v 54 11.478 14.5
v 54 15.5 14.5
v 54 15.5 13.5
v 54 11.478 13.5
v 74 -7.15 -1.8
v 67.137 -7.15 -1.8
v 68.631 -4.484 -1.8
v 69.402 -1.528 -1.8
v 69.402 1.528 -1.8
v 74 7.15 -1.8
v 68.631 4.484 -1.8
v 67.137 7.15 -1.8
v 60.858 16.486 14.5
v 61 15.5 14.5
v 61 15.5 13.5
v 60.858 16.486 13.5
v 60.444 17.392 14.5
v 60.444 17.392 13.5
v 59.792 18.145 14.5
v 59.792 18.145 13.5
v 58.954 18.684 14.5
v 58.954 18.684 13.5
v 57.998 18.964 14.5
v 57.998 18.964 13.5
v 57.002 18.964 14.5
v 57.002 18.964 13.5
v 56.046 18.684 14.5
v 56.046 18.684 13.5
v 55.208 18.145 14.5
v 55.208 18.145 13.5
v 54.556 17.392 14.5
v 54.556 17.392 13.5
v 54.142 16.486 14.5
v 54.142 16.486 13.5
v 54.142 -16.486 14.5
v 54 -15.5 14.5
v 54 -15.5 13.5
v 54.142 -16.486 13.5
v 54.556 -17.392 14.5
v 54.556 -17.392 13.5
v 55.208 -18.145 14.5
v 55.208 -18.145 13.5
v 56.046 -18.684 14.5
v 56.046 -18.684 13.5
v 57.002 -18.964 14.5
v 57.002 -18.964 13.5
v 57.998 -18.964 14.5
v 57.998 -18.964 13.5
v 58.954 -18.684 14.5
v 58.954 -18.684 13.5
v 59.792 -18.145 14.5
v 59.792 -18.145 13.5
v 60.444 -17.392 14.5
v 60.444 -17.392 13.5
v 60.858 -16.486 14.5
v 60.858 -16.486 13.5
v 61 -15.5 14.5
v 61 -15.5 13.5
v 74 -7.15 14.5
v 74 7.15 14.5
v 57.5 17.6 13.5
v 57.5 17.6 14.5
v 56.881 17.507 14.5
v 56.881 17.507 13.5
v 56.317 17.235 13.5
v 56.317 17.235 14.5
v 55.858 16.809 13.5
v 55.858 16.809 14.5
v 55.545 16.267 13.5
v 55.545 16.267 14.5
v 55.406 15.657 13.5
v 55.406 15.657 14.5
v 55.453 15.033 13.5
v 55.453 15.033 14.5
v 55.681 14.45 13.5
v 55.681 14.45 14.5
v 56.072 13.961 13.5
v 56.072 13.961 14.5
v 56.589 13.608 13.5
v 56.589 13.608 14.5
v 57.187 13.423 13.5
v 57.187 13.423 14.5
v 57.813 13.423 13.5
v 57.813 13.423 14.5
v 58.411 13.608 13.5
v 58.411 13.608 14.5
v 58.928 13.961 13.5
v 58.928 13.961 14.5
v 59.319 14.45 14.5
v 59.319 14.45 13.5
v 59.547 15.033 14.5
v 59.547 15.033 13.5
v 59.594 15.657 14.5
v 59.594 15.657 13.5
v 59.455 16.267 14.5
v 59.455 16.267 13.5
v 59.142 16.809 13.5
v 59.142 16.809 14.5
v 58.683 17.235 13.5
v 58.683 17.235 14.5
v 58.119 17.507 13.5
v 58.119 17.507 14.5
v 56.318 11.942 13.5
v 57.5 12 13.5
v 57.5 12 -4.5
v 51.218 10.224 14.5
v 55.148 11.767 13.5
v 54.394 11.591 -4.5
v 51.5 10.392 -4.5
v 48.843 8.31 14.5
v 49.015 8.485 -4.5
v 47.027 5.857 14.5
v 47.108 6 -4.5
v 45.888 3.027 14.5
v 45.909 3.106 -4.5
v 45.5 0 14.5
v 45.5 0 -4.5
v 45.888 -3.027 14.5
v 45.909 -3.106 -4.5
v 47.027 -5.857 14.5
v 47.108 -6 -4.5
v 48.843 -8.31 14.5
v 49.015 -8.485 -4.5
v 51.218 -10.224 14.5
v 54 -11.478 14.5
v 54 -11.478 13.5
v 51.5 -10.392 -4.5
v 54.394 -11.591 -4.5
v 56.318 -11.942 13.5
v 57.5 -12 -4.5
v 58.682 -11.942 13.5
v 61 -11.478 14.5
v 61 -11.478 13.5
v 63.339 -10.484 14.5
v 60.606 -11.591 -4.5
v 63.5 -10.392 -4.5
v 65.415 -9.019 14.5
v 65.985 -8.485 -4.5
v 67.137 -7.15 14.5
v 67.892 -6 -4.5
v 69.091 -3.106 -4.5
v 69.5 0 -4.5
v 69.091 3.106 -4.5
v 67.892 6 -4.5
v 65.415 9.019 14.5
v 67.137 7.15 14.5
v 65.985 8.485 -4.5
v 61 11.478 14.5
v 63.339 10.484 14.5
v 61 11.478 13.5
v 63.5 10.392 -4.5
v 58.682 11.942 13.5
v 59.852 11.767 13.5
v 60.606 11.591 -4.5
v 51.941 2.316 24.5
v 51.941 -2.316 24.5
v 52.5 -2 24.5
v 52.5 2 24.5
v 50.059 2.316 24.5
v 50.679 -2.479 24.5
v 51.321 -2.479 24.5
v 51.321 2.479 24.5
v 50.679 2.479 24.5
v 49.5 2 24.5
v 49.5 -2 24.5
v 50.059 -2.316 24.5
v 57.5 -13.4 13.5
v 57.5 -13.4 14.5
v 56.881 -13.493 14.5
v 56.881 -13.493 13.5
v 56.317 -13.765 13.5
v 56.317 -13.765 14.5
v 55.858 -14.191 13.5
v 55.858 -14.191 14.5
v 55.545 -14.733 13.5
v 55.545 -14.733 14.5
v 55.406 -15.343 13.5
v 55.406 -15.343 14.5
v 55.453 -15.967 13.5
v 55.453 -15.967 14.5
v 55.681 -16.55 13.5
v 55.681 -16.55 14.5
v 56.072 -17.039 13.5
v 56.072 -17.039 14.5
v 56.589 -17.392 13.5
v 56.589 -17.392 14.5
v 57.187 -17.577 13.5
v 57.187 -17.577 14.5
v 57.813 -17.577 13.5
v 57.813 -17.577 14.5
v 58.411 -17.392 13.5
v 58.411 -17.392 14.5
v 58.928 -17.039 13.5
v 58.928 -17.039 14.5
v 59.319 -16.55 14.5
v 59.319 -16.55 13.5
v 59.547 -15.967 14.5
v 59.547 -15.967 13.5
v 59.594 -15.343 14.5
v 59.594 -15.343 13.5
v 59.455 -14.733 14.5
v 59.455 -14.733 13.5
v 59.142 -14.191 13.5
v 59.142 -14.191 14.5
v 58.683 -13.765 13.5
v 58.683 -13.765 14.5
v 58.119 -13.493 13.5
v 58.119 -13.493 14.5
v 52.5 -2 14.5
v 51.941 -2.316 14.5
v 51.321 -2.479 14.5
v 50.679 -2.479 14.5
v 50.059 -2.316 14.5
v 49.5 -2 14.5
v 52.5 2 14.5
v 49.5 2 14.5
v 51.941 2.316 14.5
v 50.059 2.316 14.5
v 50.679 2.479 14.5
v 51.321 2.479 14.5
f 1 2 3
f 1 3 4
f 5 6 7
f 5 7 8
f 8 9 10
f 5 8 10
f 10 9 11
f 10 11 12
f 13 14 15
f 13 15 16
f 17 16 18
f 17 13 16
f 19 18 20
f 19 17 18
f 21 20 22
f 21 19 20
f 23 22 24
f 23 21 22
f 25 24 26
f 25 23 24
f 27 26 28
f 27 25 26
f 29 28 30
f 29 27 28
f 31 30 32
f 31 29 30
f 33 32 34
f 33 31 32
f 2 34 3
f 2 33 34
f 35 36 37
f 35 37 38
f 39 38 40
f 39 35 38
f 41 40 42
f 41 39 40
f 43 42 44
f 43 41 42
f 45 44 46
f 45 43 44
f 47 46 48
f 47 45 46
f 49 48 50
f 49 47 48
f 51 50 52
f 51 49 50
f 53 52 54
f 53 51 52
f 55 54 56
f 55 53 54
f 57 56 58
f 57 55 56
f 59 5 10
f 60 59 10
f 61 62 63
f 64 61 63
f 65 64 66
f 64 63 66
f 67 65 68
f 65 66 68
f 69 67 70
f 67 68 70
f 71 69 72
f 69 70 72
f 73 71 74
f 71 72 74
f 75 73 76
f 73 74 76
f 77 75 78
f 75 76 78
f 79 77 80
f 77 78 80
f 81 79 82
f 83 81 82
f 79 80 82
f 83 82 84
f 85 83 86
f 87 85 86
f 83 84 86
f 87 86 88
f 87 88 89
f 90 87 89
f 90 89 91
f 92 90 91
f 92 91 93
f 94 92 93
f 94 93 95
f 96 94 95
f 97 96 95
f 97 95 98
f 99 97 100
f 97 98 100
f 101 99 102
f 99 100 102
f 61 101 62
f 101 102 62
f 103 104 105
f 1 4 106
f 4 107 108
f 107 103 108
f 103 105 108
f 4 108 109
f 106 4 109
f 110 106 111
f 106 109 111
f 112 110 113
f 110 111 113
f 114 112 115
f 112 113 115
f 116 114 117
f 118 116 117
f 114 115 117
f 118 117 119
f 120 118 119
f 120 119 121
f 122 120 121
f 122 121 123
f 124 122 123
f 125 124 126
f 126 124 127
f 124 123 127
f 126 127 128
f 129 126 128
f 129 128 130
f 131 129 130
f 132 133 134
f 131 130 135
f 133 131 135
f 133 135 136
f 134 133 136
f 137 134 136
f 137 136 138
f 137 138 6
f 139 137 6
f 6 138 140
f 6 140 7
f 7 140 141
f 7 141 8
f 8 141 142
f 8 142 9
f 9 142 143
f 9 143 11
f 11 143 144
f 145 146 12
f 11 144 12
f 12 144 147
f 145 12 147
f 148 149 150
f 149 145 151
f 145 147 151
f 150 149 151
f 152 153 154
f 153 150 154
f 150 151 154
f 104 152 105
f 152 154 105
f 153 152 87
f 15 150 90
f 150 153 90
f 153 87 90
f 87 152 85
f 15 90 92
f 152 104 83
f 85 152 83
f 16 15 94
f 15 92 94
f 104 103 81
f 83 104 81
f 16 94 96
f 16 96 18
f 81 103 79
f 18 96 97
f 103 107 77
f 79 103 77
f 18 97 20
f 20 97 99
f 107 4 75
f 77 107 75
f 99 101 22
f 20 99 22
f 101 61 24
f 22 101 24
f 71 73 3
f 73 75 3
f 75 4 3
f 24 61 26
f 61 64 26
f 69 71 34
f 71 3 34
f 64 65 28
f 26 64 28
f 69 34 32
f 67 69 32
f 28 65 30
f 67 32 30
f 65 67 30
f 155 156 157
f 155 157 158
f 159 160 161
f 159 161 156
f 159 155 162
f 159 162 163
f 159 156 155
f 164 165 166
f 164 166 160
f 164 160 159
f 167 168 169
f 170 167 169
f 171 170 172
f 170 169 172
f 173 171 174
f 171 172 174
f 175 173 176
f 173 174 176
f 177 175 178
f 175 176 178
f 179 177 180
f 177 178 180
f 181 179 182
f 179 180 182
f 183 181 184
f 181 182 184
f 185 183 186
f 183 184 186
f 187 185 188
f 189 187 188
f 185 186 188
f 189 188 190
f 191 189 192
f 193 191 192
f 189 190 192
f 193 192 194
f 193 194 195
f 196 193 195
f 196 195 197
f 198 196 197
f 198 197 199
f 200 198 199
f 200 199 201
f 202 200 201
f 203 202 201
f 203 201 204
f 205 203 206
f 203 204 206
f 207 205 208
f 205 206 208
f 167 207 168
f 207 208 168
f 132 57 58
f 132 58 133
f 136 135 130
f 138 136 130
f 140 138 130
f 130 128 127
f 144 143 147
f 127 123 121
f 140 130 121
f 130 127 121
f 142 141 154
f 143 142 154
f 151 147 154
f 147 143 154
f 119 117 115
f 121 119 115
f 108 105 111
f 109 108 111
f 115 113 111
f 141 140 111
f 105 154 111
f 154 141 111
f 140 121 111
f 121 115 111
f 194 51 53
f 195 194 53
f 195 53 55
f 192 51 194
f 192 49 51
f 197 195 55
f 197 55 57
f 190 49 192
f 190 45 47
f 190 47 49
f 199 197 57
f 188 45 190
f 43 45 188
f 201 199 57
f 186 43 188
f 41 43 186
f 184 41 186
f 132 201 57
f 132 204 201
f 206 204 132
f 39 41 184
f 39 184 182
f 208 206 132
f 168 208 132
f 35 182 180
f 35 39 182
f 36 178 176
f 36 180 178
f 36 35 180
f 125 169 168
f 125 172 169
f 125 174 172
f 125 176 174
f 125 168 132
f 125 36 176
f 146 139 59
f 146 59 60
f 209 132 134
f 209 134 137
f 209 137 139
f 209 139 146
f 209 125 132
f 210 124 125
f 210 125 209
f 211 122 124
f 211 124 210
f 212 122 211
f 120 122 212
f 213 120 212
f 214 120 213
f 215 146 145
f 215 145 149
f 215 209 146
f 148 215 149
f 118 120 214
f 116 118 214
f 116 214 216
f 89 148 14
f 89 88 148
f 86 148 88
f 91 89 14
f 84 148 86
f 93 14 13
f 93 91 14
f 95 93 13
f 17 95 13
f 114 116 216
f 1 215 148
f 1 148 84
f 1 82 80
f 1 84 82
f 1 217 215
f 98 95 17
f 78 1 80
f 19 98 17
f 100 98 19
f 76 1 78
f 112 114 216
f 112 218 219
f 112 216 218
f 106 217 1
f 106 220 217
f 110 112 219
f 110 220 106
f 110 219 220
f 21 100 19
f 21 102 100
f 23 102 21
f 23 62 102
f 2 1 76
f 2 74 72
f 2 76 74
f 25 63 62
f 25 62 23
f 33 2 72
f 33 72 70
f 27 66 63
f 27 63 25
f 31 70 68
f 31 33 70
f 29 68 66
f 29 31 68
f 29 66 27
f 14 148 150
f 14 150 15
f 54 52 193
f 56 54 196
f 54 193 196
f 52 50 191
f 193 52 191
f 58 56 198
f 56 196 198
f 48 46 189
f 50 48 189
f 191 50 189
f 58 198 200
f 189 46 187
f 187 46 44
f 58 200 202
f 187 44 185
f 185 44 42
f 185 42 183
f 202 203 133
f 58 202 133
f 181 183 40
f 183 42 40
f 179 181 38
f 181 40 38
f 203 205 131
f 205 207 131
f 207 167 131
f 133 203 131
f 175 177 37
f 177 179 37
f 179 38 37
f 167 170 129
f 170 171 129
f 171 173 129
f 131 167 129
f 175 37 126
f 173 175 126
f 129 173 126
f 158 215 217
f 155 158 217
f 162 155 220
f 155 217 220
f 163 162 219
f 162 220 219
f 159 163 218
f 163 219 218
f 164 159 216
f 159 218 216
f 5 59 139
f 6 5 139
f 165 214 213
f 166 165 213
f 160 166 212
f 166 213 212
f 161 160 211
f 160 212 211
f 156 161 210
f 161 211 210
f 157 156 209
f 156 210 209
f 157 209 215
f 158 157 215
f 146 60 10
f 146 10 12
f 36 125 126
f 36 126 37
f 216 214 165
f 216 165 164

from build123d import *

# Parameters (mm, degrees)
SKETCH018_R             = 12
PAD008_DEPTH            = 19
SKETCH019_W             = 14.3
SKETCH019_H             = 10
PAD009_DEPTH            = 16.3
SKETCH020_R             = 2.1
PAD010_DEPTH            = 1
PAD011_DEPTH            = 10
BODY004_PLACEMENT_ANGLE = 90


with BuildPart() as part:
    # Sketch018 → Pad008 (new body)
    with BuildSketch(Plane.XY):
        Circle(SKETCH018_R)
    extrude(amount=PAD008_DEPTH)

    # Sketch019 (on Face3 of Pad008) → Pad009 (join)
    with BuildSketch(Plane.XY.offset(19)):
        with Locations((0, -11.5)):
            Rectangle(SKETCH019_W, SKETCH019_H)
    extrude(amount=-PAD009_DEPTH)

    # Sketch020 (on Face3 of Pad009) → Pad010 (join)
    with BuildSketch(Plane.XY.offset(19)):
        with BuildLine():
            ThreePointArc((15.5, -3.5), (19, 0), (15.5, 3.5))
            Line((15.5, 3.5), (-15.5, 3.5))
            ThreePointArc((-15.5, 3.5), (-19, 0), (-15.5, -3.5))
            Line((-15.5, -3.5), (15.5, -3.5))
        make_face()
        with Locations((15.5, 0)):
            Circle(SKETCH020_R, mode=Mode.SUBTRACT)
        with Locations((-15.5, 0)):
            Circle(SKETCH020_R, mode=Mode.SUBTRACT)
    extrude(amount=-PAD010_DEPTH)

    # Sketch021 (on Face11 of Pad010) → Pad011 (join)
    with BuildSketch(Plane.XY.offset(19)):
        with BuildLine():
            ThreePointArc((-2, 8), (-2.5, 6.5), (-2, 5))
            Line((-2, 5), (2, 5))
            ThreePointArc((2, 5), (2.5, 6.5), (2, 8))
            Line((-2, 8), (2, 8))
        make_face()
    extrude(amount=PAD011_DEPTH)


with BuildPart() as part_1:
    # Body004 placement: moved
    add(part.part.moved(Location((57.5, 0, -4.5))).rotate(Axis((57.5, 0, -4.5), (0, 0, 1)), BODY004_PLACEMENT_ANGLE))


solid = part_1.part
